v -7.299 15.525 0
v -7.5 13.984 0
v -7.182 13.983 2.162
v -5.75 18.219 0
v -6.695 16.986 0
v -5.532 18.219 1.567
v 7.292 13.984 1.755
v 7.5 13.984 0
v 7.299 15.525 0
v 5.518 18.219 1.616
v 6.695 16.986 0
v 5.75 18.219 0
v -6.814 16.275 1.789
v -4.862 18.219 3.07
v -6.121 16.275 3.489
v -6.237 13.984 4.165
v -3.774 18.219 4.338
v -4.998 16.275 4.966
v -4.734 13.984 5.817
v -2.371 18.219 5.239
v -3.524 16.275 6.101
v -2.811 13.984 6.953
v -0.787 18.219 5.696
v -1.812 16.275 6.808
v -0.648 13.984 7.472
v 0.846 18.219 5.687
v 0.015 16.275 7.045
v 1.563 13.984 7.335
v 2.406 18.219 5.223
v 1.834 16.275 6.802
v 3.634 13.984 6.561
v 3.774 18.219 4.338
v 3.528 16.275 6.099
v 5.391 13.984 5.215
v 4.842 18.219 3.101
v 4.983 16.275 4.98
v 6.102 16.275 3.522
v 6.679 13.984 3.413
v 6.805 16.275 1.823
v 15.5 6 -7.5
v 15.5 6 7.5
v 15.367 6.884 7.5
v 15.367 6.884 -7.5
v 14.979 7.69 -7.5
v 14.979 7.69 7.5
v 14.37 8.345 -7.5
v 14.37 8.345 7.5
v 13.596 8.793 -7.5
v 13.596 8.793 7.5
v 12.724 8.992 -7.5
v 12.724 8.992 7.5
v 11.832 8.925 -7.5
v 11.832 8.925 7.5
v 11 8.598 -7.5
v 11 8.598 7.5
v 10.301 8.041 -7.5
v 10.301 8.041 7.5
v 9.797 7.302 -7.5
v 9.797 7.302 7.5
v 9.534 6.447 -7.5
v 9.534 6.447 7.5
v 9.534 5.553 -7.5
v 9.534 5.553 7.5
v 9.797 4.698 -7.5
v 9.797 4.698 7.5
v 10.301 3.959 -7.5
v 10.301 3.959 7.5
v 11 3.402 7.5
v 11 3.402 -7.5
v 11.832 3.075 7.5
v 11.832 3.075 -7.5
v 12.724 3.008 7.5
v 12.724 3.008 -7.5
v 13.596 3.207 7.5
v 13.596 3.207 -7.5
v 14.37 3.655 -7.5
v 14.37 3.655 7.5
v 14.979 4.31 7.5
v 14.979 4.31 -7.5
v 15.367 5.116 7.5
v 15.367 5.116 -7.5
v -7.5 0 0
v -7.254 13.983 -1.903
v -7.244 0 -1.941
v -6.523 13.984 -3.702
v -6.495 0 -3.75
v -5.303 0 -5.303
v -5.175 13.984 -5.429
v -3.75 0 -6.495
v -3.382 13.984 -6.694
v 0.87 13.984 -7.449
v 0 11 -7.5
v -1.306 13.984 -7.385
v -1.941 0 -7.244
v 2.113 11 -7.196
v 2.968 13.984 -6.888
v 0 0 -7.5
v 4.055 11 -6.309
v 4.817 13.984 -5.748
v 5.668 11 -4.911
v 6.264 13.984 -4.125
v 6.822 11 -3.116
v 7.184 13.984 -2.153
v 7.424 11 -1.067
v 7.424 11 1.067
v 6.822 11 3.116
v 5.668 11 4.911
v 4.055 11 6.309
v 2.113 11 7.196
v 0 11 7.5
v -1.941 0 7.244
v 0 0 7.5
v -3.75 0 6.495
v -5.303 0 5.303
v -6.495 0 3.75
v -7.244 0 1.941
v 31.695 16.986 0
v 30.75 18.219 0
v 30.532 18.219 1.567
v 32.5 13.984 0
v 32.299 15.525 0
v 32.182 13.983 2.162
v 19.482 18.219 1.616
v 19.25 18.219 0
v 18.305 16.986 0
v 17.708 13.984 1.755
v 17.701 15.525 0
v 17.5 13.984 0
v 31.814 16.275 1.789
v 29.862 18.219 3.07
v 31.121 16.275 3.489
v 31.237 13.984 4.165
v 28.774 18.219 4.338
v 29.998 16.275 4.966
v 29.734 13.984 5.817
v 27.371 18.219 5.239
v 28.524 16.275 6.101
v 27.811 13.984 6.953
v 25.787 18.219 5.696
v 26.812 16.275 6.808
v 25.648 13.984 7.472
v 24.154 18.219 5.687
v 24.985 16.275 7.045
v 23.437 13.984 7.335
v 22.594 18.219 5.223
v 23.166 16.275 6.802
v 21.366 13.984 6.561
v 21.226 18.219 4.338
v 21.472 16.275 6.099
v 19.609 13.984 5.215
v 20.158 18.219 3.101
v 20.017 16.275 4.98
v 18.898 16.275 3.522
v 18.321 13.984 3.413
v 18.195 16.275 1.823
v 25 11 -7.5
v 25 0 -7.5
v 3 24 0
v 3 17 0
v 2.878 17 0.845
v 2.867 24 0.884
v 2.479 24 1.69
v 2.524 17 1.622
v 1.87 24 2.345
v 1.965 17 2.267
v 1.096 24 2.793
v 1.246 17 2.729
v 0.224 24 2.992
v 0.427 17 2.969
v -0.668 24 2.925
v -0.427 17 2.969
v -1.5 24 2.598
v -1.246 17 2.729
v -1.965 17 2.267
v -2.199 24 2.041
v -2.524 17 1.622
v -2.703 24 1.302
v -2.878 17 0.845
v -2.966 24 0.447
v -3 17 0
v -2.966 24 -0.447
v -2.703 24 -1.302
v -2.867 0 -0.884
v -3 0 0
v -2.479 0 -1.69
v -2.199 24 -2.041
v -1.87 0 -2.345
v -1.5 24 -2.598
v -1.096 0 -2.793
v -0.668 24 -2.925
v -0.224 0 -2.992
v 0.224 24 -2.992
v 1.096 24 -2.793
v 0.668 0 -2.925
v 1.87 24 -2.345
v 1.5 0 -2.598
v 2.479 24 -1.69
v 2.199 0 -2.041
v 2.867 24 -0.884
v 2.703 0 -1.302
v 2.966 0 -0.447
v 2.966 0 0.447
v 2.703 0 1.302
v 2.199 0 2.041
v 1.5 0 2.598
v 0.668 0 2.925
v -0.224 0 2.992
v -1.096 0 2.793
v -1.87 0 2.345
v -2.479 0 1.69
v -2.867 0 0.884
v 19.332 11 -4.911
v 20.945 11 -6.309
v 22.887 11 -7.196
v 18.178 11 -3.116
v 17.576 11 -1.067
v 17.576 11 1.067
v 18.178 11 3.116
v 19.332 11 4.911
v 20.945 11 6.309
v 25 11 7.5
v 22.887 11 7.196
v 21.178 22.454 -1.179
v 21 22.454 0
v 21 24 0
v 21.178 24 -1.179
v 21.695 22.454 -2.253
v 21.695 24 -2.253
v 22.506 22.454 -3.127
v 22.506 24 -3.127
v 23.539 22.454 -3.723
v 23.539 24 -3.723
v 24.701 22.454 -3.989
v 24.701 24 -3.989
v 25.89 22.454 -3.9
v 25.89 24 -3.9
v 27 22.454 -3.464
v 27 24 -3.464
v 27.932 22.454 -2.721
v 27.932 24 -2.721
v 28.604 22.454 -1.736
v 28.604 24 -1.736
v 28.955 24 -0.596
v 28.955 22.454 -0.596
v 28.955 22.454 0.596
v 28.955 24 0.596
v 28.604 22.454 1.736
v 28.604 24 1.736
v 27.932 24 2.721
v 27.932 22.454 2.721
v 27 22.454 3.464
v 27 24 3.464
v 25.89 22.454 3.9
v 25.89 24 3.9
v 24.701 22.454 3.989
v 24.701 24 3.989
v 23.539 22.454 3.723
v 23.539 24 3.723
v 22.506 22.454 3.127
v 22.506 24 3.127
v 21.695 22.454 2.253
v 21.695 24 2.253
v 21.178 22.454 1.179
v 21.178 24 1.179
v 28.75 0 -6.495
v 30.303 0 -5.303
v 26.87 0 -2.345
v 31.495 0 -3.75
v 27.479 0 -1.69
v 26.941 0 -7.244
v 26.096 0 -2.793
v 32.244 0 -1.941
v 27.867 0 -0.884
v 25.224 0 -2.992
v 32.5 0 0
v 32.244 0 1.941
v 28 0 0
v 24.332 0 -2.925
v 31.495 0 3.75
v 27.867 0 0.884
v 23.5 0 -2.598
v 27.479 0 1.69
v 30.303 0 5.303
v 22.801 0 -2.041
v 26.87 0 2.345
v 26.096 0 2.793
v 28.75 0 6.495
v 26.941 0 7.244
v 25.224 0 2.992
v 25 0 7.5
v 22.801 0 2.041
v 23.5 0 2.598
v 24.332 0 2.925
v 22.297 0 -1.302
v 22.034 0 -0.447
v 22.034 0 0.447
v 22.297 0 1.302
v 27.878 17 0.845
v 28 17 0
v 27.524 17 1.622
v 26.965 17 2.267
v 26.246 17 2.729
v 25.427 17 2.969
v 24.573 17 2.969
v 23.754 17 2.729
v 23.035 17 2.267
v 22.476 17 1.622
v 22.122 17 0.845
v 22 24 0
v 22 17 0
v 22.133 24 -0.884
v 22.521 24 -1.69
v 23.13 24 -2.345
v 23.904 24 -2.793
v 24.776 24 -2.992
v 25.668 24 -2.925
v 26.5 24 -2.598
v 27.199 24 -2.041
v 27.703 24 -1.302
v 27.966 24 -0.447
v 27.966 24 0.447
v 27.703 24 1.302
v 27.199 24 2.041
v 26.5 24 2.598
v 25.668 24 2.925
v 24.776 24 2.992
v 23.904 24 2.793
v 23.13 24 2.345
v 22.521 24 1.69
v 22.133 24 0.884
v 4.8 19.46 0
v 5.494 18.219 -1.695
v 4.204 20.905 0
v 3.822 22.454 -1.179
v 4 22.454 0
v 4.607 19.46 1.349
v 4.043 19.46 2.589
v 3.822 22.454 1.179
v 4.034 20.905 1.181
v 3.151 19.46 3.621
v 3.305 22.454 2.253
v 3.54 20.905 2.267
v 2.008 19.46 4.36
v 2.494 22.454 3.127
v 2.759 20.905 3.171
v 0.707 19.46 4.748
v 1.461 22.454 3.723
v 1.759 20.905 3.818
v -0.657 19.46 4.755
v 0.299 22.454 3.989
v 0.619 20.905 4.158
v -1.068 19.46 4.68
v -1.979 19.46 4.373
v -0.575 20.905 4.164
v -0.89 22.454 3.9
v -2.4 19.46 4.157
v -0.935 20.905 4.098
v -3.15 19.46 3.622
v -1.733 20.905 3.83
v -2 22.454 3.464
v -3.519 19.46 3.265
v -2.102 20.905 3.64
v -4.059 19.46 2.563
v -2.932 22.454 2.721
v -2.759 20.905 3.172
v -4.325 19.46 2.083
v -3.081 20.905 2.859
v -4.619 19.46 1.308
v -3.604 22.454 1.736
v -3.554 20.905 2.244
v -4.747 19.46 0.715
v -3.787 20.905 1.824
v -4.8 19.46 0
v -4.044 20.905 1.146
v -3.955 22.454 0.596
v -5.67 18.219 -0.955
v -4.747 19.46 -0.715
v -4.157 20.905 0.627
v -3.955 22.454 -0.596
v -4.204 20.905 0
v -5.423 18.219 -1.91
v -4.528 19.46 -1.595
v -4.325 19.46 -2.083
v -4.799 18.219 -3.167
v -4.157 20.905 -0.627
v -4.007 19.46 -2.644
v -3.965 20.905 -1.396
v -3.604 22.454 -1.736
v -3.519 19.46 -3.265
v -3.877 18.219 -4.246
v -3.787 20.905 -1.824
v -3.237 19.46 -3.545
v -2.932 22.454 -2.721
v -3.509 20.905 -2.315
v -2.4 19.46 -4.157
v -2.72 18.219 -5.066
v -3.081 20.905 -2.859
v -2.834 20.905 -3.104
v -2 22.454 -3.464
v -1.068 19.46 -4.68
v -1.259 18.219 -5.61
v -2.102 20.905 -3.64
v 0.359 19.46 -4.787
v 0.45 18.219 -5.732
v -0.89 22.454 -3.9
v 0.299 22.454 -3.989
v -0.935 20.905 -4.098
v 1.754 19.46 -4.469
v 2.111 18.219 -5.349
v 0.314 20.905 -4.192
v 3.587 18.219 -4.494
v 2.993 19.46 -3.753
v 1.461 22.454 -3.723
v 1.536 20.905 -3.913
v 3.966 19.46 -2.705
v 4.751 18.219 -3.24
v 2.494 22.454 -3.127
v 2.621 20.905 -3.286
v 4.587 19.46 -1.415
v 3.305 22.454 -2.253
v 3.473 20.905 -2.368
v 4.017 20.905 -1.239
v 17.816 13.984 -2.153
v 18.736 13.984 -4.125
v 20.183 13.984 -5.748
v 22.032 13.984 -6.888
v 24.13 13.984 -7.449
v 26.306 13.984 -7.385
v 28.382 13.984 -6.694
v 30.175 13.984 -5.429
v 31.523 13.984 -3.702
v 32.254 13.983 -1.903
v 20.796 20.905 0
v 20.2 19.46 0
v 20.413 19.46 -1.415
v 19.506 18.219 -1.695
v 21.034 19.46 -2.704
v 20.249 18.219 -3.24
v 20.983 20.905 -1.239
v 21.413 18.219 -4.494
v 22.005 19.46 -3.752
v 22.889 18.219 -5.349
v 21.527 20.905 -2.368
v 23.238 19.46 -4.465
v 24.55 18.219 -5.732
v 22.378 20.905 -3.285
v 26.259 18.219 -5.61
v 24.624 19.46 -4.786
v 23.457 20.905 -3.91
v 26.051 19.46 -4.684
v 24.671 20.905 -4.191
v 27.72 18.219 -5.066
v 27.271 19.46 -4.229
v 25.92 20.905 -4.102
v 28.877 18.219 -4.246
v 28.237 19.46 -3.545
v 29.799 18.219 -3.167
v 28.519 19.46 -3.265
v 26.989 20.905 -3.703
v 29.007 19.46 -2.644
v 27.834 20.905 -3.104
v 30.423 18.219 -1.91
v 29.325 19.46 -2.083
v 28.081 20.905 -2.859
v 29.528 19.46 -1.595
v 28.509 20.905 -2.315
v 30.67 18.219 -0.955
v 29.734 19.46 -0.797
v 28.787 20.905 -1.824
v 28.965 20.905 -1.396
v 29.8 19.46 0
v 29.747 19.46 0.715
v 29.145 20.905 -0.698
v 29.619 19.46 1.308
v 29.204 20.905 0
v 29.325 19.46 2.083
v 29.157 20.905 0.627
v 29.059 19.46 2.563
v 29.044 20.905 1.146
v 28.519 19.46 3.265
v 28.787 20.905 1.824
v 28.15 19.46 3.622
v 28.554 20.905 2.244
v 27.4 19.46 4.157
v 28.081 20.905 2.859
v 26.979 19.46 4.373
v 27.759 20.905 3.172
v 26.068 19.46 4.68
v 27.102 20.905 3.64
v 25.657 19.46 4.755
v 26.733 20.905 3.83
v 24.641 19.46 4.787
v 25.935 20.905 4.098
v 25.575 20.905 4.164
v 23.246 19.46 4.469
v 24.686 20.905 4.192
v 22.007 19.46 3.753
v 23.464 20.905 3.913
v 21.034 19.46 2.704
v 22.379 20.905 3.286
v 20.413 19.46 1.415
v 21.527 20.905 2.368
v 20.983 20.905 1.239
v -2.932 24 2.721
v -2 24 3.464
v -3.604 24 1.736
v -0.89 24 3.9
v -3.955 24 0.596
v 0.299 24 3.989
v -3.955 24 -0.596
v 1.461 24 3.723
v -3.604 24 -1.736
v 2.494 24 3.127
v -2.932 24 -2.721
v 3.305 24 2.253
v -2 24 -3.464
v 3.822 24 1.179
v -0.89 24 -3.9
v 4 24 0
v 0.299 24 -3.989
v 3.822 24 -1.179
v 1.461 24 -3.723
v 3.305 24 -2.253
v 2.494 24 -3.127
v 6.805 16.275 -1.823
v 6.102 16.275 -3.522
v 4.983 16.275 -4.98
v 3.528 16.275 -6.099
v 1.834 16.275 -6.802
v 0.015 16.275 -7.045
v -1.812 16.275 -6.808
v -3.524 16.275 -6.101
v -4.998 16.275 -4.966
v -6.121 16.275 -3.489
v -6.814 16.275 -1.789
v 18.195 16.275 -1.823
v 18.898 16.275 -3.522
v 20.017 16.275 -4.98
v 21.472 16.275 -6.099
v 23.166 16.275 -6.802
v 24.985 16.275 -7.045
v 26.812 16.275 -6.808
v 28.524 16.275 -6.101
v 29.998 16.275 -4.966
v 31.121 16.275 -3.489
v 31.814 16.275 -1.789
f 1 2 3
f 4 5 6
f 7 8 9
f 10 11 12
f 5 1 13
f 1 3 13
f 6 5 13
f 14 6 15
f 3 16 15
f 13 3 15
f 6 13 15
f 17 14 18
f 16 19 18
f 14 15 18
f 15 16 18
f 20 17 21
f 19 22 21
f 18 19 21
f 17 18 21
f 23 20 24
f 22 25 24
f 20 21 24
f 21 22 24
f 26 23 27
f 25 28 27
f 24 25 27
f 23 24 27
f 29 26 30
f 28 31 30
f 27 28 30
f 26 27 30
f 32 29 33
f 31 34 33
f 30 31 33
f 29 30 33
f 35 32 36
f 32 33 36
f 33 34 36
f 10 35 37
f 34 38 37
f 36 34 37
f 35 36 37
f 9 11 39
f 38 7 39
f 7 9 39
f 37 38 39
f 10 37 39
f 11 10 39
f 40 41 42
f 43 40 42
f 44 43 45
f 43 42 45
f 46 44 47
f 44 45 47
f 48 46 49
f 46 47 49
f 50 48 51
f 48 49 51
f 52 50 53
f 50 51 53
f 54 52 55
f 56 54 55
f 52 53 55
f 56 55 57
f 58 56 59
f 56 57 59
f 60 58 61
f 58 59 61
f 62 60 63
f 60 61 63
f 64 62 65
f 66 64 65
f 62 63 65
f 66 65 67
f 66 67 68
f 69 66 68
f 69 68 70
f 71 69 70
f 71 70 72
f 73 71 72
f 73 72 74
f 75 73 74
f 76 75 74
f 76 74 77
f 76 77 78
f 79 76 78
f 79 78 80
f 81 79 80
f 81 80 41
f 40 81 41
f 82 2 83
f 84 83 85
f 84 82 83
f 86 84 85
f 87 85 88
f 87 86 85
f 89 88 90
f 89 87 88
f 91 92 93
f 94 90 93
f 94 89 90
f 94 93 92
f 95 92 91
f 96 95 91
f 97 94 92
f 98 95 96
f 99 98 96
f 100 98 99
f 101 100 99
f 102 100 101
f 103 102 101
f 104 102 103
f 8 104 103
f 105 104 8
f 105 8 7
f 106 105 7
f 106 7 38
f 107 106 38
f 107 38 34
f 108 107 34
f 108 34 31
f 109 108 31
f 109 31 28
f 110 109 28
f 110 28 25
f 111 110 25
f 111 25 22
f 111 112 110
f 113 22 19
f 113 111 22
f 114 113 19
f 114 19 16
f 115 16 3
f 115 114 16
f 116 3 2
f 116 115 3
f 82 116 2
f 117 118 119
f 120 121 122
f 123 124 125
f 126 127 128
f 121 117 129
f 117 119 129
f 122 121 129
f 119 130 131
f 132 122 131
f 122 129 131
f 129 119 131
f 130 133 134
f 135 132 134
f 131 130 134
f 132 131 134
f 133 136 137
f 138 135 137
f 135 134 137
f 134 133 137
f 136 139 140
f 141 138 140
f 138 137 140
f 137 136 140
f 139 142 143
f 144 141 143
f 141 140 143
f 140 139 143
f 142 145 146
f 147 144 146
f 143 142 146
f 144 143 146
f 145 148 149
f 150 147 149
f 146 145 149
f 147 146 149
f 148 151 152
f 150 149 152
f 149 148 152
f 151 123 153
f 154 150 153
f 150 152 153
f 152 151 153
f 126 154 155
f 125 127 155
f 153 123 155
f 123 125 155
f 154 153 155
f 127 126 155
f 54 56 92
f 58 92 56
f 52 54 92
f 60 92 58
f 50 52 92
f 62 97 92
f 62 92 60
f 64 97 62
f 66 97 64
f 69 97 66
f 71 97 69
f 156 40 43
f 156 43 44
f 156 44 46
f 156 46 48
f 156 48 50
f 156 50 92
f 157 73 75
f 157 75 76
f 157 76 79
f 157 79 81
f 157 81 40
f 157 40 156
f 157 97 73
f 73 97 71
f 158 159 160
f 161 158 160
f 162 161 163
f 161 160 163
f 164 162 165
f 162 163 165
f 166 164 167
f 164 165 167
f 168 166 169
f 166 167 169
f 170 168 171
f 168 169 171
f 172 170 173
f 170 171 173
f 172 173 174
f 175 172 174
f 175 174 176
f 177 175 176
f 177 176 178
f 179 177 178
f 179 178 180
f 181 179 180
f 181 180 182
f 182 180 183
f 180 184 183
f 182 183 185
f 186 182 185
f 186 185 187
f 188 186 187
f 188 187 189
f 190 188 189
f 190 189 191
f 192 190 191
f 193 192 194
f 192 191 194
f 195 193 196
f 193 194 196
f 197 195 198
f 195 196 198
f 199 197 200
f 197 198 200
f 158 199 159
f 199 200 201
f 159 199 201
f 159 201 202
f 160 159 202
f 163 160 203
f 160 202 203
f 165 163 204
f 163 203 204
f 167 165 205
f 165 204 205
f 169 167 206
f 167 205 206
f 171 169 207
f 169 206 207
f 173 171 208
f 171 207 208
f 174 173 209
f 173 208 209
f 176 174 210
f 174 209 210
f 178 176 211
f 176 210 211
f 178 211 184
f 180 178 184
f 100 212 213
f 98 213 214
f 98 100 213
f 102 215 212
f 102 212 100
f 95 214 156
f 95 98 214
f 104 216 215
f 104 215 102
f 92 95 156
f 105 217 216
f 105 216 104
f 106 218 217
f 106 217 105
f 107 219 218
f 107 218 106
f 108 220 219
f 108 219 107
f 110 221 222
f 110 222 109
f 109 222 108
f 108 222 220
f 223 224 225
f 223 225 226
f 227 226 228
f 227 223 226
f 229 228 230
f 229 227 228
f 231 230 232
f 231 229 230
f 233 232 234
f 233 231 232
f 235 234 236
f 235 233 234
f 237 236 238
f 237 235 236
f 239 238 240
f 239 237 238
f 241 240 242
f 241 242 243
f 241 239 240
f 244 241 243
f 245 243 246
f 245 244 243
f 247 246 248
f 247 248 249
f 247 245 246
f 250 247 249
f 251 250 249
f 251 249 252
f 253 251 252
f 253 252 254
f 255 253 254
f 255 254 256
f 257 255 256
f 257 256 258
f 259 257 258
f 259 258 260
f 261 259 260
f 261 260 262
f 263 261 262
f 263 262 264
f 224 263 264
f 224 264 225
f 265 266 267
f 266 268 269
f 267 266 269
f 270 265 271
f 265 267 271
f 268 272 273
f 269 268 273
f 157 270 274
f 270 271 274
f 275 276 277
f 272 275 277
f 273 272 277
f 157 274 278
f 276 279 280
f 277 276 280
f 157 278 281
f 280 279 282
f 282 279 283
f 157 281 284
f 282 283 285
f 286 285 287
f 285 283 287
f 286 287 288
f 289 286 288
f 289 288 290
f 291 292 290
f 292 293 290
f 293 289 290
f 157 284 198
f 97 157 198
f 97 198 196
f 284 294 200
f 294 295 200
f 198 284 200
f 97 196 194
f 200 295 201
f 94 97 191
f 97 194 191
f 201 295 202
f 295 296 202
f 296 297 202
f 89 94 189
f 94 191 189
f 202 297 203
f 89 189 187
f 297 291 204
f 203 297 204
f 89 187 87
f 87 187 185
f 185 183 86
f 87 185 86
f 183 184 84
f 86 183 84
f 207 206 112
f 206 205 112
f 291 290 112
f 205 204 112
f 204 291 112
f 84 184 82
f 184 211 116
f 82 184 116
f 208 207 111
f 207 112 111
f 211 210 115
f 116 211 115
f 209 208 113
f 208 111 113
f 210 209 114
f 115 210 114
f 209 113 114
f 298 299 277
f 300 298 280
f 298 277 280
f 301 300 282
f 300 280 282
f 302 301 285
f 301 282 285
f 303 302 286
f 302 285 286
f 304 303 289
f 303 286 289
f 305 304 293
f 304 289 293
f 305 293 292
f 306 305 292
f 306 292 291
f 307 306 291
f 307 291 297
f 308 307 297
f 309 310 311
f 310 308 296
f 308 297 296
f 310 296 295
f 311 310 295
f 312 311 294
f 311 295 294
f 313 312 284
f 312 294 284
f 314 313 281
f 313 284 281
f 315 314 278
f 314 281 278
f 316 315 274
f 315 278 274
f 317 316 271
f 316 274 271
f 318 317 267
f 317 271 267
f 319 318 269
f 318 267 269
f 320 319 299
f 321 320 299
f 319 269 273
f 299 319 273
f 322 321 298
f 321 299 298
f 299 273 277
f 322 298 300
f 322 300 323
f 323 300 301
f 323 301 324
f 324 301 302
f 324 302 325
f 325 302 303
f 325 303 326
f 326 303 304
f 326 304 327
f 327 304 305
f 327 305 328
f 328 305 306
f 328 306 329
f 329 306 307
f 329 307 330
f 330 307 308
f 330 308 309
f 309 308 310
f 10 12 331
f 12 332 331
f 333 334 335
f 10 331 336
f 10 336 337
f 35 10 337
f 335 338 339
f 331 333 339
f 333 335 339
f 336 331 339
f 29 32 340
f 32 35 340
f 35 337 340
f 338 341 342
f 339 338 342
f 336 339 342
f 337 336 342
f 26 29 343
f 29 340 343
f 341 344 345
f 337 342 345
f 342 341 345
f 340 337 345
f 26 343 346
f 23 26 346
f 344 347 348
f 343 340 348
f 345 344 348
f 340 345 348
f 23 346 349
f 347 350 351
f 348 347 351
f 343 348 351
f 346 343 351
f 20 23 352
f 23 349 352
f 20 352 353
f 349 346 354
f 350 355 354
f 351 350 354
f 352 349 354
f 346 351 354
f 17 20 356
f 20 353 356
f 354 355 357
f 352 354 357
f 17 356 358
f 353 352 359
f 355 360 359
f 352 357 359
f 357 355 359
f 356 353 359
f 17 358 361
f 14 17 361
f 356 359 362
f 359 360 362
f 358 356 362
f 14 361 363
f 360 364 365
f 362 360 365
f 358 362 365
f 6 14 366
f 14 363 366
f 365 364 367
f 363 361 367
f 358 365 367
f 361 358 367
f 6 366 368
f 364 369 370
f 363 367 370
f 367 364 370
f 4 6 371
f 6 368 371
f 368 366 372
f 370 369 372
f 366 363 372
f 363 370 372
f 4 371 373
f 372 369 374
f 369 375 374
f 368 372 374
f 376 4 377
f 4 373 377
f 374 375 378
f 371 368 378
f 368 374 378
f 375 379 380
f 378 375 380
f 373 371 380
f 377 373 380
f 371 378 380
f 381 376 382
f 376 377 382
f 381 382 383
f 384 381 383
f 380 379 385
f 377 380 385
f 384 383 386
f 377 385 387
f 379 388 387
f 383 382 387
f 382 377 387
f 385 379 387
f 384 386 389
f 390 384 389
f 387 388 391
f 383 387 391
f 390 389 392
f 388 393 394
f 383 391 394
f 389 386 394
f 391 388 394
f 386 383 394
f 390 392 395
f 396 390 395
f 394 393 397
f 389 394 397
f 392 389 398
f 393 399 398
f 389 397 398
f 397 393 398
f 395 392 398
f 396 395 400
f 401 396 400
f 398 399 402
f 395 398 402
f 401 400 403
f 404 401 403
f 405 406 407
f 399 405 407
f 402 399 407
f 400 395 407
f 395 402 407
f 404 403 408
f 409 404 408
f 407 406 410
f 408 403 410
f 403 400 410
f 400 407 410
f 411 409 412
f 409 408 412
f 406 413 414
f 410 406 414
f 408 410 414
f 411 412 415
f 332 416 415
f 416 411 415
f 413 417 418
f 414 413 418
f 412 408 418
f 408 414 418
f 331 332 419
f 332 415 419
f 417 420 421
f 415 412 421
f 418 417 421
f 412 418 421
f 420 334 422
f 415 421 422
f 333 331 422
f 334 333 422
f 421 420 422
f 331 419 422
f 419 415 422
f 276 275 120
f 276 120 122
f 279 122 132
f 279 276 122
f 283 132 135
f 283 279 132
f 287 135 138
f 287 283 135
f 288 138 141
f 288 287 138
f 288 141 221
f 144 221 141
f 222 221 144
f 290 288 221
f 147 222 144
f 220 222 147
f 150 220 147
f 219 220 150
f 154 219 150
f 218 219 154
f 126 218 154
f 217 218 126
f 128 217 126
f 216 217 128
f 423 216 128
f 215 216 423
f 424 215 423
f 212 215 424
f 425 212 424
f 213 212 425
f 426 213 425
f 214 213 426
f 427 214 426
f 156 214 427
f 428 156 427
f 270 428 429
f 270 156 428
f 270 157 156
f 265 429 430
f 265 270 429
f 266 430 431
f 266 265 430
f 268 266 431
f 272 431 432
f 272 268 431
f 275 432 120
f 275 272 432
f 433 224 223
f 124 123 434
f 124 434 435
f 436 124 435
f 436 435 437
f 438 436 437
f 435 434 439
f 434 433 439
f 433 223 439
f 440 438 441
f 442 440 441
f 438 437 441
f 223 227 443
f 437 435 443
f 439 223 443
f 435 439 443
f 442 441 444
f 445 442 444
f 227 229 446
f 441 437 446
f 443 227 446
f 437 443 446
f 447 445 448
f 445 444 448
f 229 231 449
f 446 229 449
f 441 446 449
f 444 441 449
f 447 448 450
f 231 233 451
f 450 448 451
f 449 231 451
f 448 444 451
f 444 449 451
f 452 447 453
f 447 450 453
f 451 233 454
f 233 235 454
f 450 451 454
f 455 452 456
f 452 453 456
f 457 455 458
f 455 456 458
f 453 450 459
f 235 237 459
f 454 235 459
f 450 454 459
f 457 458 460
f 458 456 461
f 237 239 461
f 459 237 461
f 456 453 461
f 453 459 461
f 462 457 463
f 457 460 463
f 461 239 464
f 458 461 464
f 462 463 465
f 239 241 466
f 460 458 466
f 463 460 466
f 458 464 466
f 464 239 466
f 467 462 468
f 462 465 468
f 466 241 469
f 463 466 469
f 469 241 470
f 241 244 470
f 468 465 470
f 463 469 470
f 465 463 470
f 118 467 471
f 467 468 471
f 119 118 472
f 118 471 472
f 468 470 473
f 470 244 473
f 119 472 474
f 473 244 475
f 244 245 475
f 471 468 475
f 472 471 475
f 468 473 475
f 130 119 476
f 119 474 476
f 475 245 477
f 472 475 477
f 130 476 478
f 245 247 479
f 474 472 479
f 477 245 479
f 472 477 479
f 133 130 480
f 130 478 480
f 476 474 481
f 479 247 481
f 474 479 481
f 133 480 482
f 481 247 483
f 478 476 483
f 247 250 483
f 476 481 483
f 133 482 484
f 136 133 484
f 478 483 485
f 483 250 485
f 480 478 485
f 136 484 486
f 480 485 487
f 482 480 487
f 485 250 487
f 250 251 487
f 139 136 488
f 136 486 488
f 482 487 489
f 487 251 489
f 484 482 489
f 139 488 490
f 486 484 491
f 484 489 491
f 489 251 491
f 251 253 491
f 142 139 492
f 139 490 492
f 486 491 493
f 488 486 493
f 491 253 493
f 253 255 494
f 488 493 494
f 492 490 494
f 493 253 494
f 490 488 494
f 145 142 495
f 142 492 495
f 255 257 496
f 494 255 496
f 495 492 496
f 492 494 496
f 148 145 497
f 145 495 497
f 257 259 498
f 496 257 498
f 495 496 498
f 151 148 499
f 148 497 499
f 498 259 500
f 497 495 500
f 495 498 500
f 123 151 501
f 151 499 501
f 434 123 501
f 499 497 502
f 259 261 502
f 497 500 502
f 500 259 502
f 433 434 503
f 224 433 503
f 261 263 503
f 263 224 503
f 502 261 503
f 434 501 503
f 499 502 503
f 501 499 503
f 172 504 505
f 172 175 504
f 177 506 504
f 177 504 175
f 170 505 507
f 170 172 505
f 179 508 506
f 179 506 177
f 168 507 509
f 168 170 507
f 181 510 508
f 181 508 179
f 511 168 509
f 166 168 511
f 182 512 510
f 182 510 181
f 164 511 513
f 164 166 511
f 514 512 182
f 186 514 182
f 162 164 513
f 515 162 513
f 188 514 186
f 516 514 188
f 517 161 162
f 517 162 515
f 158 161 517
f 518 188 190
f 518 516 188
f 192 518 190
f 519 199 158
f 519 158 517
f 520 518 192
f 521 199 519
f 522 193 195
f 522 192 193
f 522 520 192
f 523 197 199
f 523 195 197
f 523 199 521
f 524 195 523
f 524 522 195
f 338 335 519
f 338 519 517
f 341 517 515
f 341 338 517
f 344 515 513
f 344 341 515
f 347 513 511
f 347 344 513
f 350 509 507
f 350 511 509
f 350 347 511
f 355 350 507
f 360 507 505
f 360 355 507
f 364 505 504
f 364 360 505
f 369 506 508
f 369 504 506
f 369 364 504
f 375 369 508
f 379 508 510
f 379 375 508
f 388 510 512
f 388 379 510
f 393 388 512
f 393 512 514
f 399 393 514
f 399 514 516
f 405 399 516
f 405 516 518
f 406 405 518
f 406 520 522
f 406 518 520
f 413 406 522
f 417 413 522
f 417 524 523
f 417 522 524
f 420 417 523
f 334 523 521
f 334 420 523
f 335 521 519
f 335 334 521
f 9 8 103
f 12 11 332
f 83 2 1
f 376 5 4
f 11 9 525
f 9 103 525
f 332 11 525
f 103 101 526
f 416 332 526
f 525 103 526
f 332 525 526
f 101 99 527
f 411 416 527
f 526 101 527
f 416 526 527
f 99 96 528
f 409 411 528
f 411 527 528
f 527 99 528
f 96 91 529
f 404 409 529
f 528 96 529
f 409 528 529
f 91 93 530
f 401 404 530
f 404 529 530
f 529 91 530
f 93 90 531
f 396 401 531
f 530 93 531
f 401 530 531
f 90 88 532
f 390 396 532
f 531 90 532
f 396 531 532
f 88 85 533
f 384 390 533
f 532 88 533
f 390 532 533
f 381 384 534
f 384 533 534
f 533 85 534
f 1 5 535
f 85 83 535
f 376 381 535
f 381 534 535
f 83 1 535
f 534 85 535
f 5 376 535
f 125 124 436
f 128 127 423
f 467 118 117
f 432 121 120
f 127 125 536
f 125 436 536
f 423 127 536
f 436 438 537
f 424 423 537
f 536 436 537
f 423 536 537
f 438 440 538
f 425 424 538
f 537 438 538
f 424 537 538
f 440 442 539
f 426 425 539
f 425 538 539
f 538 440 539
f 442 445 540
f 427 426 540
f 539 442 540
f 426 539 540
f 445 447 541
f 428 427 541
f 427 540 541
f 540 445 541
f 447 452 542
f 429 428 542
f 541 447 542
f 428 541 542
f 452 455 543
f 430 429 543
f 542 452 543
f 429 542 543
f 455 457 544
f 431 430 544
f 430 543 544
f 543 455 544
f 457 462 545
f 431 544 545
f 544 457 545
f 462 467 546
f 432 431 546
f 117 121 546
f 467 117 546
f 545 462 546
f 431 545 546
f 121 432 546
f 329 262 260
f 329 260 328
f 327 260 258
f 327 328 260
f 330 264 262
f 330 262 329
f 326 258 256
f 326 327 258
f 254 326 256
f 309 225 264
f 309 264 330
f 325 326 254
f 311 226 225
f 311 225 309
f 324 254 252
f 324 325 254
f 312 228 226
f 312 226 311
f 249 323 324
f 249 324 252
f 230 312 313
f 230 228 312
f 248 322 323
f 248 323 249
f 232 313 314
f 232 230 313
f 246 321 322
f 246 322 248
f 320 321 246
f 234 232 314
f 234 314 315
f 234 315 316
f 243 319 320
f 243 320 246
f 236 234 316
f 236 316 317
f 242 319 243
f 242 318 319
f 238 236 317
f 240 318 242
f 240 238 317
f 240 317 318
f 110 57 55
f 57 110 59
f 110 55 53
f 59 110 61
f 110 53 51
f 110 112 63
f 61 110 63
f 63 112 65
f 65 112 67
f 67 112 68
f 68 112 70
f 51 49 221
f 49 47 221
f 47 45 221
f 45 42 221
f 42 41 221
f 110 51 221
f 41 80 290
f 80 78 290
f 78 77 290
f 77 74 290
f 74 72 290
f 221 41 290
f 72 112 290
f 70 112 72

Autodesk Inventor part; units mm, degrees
ref_plane "XZ Plane" through (0, 0, 0) normal (0, 1, 0) x (-1, 0, 0)
ref_plane "XY Plane" through (0, 0, 0) normal (0, 0, 1) x (1, 0, 0)
sketch "Sketch1" plane through (0, 0, 0) normal (0, 1, 0) x (-1, 0, 0)
  circle A0 centre (0, 0) radius 7.5
  circle A1 centre (0, 0) radius 3
  dimension "d0" = 15
  dimension "d1" = 6
extrude "Extrusion1" add sketch "Sketch1" along normal blind 17
sketch "Sketch2" plane through (0, 17, 0) normal (0, 1, 0) x (1, 0, 0)
  circle A0 centre (0, 0) radius 3 projected
  circle A1 centre (0, 0) radius 2.75
  circle A2 centre (0, 0) radius 4
  dimension "d4" = 5.5
  dimension "d5" = 8
extrude "Extrusion2" add sketch "Sketch2" along normal blind 7 contours A2
fillet "Fillet1" radius 6 1 edges at (-4, 17, 0)
fillet "Fillet2" radius 6 2 edges at (0, 17, -7.5) (0, 17, 7.5)
ref_plane "Work Plane1" through (12.5, 0, 0) normal (1, 0, 0) x (0, 1, 0)
mirror "Mirror1" about plane through (12.5, 0, 0) normal (1, 0, 0) of "Extrusion1", "Extrusion2", "Fillet1", "Fillet2"
sketch "Sketch3" plane through (0, 0, 0) normal (0, 1, 0) x (-1, 0, 0)
  circle A0 centre (-25, 0) radius 3 projected
  line L0 (-25, 0) -> (-25, 3)
  line L1 (-25, 0) -> (-25, -3)
  line L2 (0, 0) -> (0, -3)
  circle A1 centre (0, 0) radius 3 projected
  line L3 (0, 0) -> (0, 3)
  line L4 (-25, 3) -> (0, 3)
  line L5 (0, 3) -> (0, 7.5)
  line L6 (0, 7.5) -> (-25, 7.5)
  line L7 (-25, 7.5) -> (-25, 3)
  line L8 (-25, -3) -> (0, -3)
  line L9 (0, -3) -> (0, -7.5)
  line L10 (0, -7.5) -> (-25, -7.5)
  line L11 (-25, -7.5) -> (-25, -3)
  point P0 (0, -3)
  point P1 (0, 3)
  dimension "d11" = 25
  dimension "d12" = 4.5
  dimension "d13" = 25
  dimension "d14" = 4.5
extrude "Extrusion3" add sketch "Sketch3" along normal blind 11 contours A0 L4 A1 L8 | L7 L6 L5 L4 | L8 L9 L10 L11
sketch "Sketch4" plane through (0, 0, 7.5) normal (0, 0, 1) x (1, 0, 0)
  line L0 (25, 11) -> (0, 11) projected
  line L1 (12.5, 11) -> (12.5, 6)
  circle A0 centre (12.5, 6) radius 3
  point P0 (0, 0)
  dimension "d17" = 5
  dimension "d18" = 6
extrude "Extrusion4" cut sketch "Sketch4" against normal through all
properties part number "4mm_Roller_Spacer_simple"
